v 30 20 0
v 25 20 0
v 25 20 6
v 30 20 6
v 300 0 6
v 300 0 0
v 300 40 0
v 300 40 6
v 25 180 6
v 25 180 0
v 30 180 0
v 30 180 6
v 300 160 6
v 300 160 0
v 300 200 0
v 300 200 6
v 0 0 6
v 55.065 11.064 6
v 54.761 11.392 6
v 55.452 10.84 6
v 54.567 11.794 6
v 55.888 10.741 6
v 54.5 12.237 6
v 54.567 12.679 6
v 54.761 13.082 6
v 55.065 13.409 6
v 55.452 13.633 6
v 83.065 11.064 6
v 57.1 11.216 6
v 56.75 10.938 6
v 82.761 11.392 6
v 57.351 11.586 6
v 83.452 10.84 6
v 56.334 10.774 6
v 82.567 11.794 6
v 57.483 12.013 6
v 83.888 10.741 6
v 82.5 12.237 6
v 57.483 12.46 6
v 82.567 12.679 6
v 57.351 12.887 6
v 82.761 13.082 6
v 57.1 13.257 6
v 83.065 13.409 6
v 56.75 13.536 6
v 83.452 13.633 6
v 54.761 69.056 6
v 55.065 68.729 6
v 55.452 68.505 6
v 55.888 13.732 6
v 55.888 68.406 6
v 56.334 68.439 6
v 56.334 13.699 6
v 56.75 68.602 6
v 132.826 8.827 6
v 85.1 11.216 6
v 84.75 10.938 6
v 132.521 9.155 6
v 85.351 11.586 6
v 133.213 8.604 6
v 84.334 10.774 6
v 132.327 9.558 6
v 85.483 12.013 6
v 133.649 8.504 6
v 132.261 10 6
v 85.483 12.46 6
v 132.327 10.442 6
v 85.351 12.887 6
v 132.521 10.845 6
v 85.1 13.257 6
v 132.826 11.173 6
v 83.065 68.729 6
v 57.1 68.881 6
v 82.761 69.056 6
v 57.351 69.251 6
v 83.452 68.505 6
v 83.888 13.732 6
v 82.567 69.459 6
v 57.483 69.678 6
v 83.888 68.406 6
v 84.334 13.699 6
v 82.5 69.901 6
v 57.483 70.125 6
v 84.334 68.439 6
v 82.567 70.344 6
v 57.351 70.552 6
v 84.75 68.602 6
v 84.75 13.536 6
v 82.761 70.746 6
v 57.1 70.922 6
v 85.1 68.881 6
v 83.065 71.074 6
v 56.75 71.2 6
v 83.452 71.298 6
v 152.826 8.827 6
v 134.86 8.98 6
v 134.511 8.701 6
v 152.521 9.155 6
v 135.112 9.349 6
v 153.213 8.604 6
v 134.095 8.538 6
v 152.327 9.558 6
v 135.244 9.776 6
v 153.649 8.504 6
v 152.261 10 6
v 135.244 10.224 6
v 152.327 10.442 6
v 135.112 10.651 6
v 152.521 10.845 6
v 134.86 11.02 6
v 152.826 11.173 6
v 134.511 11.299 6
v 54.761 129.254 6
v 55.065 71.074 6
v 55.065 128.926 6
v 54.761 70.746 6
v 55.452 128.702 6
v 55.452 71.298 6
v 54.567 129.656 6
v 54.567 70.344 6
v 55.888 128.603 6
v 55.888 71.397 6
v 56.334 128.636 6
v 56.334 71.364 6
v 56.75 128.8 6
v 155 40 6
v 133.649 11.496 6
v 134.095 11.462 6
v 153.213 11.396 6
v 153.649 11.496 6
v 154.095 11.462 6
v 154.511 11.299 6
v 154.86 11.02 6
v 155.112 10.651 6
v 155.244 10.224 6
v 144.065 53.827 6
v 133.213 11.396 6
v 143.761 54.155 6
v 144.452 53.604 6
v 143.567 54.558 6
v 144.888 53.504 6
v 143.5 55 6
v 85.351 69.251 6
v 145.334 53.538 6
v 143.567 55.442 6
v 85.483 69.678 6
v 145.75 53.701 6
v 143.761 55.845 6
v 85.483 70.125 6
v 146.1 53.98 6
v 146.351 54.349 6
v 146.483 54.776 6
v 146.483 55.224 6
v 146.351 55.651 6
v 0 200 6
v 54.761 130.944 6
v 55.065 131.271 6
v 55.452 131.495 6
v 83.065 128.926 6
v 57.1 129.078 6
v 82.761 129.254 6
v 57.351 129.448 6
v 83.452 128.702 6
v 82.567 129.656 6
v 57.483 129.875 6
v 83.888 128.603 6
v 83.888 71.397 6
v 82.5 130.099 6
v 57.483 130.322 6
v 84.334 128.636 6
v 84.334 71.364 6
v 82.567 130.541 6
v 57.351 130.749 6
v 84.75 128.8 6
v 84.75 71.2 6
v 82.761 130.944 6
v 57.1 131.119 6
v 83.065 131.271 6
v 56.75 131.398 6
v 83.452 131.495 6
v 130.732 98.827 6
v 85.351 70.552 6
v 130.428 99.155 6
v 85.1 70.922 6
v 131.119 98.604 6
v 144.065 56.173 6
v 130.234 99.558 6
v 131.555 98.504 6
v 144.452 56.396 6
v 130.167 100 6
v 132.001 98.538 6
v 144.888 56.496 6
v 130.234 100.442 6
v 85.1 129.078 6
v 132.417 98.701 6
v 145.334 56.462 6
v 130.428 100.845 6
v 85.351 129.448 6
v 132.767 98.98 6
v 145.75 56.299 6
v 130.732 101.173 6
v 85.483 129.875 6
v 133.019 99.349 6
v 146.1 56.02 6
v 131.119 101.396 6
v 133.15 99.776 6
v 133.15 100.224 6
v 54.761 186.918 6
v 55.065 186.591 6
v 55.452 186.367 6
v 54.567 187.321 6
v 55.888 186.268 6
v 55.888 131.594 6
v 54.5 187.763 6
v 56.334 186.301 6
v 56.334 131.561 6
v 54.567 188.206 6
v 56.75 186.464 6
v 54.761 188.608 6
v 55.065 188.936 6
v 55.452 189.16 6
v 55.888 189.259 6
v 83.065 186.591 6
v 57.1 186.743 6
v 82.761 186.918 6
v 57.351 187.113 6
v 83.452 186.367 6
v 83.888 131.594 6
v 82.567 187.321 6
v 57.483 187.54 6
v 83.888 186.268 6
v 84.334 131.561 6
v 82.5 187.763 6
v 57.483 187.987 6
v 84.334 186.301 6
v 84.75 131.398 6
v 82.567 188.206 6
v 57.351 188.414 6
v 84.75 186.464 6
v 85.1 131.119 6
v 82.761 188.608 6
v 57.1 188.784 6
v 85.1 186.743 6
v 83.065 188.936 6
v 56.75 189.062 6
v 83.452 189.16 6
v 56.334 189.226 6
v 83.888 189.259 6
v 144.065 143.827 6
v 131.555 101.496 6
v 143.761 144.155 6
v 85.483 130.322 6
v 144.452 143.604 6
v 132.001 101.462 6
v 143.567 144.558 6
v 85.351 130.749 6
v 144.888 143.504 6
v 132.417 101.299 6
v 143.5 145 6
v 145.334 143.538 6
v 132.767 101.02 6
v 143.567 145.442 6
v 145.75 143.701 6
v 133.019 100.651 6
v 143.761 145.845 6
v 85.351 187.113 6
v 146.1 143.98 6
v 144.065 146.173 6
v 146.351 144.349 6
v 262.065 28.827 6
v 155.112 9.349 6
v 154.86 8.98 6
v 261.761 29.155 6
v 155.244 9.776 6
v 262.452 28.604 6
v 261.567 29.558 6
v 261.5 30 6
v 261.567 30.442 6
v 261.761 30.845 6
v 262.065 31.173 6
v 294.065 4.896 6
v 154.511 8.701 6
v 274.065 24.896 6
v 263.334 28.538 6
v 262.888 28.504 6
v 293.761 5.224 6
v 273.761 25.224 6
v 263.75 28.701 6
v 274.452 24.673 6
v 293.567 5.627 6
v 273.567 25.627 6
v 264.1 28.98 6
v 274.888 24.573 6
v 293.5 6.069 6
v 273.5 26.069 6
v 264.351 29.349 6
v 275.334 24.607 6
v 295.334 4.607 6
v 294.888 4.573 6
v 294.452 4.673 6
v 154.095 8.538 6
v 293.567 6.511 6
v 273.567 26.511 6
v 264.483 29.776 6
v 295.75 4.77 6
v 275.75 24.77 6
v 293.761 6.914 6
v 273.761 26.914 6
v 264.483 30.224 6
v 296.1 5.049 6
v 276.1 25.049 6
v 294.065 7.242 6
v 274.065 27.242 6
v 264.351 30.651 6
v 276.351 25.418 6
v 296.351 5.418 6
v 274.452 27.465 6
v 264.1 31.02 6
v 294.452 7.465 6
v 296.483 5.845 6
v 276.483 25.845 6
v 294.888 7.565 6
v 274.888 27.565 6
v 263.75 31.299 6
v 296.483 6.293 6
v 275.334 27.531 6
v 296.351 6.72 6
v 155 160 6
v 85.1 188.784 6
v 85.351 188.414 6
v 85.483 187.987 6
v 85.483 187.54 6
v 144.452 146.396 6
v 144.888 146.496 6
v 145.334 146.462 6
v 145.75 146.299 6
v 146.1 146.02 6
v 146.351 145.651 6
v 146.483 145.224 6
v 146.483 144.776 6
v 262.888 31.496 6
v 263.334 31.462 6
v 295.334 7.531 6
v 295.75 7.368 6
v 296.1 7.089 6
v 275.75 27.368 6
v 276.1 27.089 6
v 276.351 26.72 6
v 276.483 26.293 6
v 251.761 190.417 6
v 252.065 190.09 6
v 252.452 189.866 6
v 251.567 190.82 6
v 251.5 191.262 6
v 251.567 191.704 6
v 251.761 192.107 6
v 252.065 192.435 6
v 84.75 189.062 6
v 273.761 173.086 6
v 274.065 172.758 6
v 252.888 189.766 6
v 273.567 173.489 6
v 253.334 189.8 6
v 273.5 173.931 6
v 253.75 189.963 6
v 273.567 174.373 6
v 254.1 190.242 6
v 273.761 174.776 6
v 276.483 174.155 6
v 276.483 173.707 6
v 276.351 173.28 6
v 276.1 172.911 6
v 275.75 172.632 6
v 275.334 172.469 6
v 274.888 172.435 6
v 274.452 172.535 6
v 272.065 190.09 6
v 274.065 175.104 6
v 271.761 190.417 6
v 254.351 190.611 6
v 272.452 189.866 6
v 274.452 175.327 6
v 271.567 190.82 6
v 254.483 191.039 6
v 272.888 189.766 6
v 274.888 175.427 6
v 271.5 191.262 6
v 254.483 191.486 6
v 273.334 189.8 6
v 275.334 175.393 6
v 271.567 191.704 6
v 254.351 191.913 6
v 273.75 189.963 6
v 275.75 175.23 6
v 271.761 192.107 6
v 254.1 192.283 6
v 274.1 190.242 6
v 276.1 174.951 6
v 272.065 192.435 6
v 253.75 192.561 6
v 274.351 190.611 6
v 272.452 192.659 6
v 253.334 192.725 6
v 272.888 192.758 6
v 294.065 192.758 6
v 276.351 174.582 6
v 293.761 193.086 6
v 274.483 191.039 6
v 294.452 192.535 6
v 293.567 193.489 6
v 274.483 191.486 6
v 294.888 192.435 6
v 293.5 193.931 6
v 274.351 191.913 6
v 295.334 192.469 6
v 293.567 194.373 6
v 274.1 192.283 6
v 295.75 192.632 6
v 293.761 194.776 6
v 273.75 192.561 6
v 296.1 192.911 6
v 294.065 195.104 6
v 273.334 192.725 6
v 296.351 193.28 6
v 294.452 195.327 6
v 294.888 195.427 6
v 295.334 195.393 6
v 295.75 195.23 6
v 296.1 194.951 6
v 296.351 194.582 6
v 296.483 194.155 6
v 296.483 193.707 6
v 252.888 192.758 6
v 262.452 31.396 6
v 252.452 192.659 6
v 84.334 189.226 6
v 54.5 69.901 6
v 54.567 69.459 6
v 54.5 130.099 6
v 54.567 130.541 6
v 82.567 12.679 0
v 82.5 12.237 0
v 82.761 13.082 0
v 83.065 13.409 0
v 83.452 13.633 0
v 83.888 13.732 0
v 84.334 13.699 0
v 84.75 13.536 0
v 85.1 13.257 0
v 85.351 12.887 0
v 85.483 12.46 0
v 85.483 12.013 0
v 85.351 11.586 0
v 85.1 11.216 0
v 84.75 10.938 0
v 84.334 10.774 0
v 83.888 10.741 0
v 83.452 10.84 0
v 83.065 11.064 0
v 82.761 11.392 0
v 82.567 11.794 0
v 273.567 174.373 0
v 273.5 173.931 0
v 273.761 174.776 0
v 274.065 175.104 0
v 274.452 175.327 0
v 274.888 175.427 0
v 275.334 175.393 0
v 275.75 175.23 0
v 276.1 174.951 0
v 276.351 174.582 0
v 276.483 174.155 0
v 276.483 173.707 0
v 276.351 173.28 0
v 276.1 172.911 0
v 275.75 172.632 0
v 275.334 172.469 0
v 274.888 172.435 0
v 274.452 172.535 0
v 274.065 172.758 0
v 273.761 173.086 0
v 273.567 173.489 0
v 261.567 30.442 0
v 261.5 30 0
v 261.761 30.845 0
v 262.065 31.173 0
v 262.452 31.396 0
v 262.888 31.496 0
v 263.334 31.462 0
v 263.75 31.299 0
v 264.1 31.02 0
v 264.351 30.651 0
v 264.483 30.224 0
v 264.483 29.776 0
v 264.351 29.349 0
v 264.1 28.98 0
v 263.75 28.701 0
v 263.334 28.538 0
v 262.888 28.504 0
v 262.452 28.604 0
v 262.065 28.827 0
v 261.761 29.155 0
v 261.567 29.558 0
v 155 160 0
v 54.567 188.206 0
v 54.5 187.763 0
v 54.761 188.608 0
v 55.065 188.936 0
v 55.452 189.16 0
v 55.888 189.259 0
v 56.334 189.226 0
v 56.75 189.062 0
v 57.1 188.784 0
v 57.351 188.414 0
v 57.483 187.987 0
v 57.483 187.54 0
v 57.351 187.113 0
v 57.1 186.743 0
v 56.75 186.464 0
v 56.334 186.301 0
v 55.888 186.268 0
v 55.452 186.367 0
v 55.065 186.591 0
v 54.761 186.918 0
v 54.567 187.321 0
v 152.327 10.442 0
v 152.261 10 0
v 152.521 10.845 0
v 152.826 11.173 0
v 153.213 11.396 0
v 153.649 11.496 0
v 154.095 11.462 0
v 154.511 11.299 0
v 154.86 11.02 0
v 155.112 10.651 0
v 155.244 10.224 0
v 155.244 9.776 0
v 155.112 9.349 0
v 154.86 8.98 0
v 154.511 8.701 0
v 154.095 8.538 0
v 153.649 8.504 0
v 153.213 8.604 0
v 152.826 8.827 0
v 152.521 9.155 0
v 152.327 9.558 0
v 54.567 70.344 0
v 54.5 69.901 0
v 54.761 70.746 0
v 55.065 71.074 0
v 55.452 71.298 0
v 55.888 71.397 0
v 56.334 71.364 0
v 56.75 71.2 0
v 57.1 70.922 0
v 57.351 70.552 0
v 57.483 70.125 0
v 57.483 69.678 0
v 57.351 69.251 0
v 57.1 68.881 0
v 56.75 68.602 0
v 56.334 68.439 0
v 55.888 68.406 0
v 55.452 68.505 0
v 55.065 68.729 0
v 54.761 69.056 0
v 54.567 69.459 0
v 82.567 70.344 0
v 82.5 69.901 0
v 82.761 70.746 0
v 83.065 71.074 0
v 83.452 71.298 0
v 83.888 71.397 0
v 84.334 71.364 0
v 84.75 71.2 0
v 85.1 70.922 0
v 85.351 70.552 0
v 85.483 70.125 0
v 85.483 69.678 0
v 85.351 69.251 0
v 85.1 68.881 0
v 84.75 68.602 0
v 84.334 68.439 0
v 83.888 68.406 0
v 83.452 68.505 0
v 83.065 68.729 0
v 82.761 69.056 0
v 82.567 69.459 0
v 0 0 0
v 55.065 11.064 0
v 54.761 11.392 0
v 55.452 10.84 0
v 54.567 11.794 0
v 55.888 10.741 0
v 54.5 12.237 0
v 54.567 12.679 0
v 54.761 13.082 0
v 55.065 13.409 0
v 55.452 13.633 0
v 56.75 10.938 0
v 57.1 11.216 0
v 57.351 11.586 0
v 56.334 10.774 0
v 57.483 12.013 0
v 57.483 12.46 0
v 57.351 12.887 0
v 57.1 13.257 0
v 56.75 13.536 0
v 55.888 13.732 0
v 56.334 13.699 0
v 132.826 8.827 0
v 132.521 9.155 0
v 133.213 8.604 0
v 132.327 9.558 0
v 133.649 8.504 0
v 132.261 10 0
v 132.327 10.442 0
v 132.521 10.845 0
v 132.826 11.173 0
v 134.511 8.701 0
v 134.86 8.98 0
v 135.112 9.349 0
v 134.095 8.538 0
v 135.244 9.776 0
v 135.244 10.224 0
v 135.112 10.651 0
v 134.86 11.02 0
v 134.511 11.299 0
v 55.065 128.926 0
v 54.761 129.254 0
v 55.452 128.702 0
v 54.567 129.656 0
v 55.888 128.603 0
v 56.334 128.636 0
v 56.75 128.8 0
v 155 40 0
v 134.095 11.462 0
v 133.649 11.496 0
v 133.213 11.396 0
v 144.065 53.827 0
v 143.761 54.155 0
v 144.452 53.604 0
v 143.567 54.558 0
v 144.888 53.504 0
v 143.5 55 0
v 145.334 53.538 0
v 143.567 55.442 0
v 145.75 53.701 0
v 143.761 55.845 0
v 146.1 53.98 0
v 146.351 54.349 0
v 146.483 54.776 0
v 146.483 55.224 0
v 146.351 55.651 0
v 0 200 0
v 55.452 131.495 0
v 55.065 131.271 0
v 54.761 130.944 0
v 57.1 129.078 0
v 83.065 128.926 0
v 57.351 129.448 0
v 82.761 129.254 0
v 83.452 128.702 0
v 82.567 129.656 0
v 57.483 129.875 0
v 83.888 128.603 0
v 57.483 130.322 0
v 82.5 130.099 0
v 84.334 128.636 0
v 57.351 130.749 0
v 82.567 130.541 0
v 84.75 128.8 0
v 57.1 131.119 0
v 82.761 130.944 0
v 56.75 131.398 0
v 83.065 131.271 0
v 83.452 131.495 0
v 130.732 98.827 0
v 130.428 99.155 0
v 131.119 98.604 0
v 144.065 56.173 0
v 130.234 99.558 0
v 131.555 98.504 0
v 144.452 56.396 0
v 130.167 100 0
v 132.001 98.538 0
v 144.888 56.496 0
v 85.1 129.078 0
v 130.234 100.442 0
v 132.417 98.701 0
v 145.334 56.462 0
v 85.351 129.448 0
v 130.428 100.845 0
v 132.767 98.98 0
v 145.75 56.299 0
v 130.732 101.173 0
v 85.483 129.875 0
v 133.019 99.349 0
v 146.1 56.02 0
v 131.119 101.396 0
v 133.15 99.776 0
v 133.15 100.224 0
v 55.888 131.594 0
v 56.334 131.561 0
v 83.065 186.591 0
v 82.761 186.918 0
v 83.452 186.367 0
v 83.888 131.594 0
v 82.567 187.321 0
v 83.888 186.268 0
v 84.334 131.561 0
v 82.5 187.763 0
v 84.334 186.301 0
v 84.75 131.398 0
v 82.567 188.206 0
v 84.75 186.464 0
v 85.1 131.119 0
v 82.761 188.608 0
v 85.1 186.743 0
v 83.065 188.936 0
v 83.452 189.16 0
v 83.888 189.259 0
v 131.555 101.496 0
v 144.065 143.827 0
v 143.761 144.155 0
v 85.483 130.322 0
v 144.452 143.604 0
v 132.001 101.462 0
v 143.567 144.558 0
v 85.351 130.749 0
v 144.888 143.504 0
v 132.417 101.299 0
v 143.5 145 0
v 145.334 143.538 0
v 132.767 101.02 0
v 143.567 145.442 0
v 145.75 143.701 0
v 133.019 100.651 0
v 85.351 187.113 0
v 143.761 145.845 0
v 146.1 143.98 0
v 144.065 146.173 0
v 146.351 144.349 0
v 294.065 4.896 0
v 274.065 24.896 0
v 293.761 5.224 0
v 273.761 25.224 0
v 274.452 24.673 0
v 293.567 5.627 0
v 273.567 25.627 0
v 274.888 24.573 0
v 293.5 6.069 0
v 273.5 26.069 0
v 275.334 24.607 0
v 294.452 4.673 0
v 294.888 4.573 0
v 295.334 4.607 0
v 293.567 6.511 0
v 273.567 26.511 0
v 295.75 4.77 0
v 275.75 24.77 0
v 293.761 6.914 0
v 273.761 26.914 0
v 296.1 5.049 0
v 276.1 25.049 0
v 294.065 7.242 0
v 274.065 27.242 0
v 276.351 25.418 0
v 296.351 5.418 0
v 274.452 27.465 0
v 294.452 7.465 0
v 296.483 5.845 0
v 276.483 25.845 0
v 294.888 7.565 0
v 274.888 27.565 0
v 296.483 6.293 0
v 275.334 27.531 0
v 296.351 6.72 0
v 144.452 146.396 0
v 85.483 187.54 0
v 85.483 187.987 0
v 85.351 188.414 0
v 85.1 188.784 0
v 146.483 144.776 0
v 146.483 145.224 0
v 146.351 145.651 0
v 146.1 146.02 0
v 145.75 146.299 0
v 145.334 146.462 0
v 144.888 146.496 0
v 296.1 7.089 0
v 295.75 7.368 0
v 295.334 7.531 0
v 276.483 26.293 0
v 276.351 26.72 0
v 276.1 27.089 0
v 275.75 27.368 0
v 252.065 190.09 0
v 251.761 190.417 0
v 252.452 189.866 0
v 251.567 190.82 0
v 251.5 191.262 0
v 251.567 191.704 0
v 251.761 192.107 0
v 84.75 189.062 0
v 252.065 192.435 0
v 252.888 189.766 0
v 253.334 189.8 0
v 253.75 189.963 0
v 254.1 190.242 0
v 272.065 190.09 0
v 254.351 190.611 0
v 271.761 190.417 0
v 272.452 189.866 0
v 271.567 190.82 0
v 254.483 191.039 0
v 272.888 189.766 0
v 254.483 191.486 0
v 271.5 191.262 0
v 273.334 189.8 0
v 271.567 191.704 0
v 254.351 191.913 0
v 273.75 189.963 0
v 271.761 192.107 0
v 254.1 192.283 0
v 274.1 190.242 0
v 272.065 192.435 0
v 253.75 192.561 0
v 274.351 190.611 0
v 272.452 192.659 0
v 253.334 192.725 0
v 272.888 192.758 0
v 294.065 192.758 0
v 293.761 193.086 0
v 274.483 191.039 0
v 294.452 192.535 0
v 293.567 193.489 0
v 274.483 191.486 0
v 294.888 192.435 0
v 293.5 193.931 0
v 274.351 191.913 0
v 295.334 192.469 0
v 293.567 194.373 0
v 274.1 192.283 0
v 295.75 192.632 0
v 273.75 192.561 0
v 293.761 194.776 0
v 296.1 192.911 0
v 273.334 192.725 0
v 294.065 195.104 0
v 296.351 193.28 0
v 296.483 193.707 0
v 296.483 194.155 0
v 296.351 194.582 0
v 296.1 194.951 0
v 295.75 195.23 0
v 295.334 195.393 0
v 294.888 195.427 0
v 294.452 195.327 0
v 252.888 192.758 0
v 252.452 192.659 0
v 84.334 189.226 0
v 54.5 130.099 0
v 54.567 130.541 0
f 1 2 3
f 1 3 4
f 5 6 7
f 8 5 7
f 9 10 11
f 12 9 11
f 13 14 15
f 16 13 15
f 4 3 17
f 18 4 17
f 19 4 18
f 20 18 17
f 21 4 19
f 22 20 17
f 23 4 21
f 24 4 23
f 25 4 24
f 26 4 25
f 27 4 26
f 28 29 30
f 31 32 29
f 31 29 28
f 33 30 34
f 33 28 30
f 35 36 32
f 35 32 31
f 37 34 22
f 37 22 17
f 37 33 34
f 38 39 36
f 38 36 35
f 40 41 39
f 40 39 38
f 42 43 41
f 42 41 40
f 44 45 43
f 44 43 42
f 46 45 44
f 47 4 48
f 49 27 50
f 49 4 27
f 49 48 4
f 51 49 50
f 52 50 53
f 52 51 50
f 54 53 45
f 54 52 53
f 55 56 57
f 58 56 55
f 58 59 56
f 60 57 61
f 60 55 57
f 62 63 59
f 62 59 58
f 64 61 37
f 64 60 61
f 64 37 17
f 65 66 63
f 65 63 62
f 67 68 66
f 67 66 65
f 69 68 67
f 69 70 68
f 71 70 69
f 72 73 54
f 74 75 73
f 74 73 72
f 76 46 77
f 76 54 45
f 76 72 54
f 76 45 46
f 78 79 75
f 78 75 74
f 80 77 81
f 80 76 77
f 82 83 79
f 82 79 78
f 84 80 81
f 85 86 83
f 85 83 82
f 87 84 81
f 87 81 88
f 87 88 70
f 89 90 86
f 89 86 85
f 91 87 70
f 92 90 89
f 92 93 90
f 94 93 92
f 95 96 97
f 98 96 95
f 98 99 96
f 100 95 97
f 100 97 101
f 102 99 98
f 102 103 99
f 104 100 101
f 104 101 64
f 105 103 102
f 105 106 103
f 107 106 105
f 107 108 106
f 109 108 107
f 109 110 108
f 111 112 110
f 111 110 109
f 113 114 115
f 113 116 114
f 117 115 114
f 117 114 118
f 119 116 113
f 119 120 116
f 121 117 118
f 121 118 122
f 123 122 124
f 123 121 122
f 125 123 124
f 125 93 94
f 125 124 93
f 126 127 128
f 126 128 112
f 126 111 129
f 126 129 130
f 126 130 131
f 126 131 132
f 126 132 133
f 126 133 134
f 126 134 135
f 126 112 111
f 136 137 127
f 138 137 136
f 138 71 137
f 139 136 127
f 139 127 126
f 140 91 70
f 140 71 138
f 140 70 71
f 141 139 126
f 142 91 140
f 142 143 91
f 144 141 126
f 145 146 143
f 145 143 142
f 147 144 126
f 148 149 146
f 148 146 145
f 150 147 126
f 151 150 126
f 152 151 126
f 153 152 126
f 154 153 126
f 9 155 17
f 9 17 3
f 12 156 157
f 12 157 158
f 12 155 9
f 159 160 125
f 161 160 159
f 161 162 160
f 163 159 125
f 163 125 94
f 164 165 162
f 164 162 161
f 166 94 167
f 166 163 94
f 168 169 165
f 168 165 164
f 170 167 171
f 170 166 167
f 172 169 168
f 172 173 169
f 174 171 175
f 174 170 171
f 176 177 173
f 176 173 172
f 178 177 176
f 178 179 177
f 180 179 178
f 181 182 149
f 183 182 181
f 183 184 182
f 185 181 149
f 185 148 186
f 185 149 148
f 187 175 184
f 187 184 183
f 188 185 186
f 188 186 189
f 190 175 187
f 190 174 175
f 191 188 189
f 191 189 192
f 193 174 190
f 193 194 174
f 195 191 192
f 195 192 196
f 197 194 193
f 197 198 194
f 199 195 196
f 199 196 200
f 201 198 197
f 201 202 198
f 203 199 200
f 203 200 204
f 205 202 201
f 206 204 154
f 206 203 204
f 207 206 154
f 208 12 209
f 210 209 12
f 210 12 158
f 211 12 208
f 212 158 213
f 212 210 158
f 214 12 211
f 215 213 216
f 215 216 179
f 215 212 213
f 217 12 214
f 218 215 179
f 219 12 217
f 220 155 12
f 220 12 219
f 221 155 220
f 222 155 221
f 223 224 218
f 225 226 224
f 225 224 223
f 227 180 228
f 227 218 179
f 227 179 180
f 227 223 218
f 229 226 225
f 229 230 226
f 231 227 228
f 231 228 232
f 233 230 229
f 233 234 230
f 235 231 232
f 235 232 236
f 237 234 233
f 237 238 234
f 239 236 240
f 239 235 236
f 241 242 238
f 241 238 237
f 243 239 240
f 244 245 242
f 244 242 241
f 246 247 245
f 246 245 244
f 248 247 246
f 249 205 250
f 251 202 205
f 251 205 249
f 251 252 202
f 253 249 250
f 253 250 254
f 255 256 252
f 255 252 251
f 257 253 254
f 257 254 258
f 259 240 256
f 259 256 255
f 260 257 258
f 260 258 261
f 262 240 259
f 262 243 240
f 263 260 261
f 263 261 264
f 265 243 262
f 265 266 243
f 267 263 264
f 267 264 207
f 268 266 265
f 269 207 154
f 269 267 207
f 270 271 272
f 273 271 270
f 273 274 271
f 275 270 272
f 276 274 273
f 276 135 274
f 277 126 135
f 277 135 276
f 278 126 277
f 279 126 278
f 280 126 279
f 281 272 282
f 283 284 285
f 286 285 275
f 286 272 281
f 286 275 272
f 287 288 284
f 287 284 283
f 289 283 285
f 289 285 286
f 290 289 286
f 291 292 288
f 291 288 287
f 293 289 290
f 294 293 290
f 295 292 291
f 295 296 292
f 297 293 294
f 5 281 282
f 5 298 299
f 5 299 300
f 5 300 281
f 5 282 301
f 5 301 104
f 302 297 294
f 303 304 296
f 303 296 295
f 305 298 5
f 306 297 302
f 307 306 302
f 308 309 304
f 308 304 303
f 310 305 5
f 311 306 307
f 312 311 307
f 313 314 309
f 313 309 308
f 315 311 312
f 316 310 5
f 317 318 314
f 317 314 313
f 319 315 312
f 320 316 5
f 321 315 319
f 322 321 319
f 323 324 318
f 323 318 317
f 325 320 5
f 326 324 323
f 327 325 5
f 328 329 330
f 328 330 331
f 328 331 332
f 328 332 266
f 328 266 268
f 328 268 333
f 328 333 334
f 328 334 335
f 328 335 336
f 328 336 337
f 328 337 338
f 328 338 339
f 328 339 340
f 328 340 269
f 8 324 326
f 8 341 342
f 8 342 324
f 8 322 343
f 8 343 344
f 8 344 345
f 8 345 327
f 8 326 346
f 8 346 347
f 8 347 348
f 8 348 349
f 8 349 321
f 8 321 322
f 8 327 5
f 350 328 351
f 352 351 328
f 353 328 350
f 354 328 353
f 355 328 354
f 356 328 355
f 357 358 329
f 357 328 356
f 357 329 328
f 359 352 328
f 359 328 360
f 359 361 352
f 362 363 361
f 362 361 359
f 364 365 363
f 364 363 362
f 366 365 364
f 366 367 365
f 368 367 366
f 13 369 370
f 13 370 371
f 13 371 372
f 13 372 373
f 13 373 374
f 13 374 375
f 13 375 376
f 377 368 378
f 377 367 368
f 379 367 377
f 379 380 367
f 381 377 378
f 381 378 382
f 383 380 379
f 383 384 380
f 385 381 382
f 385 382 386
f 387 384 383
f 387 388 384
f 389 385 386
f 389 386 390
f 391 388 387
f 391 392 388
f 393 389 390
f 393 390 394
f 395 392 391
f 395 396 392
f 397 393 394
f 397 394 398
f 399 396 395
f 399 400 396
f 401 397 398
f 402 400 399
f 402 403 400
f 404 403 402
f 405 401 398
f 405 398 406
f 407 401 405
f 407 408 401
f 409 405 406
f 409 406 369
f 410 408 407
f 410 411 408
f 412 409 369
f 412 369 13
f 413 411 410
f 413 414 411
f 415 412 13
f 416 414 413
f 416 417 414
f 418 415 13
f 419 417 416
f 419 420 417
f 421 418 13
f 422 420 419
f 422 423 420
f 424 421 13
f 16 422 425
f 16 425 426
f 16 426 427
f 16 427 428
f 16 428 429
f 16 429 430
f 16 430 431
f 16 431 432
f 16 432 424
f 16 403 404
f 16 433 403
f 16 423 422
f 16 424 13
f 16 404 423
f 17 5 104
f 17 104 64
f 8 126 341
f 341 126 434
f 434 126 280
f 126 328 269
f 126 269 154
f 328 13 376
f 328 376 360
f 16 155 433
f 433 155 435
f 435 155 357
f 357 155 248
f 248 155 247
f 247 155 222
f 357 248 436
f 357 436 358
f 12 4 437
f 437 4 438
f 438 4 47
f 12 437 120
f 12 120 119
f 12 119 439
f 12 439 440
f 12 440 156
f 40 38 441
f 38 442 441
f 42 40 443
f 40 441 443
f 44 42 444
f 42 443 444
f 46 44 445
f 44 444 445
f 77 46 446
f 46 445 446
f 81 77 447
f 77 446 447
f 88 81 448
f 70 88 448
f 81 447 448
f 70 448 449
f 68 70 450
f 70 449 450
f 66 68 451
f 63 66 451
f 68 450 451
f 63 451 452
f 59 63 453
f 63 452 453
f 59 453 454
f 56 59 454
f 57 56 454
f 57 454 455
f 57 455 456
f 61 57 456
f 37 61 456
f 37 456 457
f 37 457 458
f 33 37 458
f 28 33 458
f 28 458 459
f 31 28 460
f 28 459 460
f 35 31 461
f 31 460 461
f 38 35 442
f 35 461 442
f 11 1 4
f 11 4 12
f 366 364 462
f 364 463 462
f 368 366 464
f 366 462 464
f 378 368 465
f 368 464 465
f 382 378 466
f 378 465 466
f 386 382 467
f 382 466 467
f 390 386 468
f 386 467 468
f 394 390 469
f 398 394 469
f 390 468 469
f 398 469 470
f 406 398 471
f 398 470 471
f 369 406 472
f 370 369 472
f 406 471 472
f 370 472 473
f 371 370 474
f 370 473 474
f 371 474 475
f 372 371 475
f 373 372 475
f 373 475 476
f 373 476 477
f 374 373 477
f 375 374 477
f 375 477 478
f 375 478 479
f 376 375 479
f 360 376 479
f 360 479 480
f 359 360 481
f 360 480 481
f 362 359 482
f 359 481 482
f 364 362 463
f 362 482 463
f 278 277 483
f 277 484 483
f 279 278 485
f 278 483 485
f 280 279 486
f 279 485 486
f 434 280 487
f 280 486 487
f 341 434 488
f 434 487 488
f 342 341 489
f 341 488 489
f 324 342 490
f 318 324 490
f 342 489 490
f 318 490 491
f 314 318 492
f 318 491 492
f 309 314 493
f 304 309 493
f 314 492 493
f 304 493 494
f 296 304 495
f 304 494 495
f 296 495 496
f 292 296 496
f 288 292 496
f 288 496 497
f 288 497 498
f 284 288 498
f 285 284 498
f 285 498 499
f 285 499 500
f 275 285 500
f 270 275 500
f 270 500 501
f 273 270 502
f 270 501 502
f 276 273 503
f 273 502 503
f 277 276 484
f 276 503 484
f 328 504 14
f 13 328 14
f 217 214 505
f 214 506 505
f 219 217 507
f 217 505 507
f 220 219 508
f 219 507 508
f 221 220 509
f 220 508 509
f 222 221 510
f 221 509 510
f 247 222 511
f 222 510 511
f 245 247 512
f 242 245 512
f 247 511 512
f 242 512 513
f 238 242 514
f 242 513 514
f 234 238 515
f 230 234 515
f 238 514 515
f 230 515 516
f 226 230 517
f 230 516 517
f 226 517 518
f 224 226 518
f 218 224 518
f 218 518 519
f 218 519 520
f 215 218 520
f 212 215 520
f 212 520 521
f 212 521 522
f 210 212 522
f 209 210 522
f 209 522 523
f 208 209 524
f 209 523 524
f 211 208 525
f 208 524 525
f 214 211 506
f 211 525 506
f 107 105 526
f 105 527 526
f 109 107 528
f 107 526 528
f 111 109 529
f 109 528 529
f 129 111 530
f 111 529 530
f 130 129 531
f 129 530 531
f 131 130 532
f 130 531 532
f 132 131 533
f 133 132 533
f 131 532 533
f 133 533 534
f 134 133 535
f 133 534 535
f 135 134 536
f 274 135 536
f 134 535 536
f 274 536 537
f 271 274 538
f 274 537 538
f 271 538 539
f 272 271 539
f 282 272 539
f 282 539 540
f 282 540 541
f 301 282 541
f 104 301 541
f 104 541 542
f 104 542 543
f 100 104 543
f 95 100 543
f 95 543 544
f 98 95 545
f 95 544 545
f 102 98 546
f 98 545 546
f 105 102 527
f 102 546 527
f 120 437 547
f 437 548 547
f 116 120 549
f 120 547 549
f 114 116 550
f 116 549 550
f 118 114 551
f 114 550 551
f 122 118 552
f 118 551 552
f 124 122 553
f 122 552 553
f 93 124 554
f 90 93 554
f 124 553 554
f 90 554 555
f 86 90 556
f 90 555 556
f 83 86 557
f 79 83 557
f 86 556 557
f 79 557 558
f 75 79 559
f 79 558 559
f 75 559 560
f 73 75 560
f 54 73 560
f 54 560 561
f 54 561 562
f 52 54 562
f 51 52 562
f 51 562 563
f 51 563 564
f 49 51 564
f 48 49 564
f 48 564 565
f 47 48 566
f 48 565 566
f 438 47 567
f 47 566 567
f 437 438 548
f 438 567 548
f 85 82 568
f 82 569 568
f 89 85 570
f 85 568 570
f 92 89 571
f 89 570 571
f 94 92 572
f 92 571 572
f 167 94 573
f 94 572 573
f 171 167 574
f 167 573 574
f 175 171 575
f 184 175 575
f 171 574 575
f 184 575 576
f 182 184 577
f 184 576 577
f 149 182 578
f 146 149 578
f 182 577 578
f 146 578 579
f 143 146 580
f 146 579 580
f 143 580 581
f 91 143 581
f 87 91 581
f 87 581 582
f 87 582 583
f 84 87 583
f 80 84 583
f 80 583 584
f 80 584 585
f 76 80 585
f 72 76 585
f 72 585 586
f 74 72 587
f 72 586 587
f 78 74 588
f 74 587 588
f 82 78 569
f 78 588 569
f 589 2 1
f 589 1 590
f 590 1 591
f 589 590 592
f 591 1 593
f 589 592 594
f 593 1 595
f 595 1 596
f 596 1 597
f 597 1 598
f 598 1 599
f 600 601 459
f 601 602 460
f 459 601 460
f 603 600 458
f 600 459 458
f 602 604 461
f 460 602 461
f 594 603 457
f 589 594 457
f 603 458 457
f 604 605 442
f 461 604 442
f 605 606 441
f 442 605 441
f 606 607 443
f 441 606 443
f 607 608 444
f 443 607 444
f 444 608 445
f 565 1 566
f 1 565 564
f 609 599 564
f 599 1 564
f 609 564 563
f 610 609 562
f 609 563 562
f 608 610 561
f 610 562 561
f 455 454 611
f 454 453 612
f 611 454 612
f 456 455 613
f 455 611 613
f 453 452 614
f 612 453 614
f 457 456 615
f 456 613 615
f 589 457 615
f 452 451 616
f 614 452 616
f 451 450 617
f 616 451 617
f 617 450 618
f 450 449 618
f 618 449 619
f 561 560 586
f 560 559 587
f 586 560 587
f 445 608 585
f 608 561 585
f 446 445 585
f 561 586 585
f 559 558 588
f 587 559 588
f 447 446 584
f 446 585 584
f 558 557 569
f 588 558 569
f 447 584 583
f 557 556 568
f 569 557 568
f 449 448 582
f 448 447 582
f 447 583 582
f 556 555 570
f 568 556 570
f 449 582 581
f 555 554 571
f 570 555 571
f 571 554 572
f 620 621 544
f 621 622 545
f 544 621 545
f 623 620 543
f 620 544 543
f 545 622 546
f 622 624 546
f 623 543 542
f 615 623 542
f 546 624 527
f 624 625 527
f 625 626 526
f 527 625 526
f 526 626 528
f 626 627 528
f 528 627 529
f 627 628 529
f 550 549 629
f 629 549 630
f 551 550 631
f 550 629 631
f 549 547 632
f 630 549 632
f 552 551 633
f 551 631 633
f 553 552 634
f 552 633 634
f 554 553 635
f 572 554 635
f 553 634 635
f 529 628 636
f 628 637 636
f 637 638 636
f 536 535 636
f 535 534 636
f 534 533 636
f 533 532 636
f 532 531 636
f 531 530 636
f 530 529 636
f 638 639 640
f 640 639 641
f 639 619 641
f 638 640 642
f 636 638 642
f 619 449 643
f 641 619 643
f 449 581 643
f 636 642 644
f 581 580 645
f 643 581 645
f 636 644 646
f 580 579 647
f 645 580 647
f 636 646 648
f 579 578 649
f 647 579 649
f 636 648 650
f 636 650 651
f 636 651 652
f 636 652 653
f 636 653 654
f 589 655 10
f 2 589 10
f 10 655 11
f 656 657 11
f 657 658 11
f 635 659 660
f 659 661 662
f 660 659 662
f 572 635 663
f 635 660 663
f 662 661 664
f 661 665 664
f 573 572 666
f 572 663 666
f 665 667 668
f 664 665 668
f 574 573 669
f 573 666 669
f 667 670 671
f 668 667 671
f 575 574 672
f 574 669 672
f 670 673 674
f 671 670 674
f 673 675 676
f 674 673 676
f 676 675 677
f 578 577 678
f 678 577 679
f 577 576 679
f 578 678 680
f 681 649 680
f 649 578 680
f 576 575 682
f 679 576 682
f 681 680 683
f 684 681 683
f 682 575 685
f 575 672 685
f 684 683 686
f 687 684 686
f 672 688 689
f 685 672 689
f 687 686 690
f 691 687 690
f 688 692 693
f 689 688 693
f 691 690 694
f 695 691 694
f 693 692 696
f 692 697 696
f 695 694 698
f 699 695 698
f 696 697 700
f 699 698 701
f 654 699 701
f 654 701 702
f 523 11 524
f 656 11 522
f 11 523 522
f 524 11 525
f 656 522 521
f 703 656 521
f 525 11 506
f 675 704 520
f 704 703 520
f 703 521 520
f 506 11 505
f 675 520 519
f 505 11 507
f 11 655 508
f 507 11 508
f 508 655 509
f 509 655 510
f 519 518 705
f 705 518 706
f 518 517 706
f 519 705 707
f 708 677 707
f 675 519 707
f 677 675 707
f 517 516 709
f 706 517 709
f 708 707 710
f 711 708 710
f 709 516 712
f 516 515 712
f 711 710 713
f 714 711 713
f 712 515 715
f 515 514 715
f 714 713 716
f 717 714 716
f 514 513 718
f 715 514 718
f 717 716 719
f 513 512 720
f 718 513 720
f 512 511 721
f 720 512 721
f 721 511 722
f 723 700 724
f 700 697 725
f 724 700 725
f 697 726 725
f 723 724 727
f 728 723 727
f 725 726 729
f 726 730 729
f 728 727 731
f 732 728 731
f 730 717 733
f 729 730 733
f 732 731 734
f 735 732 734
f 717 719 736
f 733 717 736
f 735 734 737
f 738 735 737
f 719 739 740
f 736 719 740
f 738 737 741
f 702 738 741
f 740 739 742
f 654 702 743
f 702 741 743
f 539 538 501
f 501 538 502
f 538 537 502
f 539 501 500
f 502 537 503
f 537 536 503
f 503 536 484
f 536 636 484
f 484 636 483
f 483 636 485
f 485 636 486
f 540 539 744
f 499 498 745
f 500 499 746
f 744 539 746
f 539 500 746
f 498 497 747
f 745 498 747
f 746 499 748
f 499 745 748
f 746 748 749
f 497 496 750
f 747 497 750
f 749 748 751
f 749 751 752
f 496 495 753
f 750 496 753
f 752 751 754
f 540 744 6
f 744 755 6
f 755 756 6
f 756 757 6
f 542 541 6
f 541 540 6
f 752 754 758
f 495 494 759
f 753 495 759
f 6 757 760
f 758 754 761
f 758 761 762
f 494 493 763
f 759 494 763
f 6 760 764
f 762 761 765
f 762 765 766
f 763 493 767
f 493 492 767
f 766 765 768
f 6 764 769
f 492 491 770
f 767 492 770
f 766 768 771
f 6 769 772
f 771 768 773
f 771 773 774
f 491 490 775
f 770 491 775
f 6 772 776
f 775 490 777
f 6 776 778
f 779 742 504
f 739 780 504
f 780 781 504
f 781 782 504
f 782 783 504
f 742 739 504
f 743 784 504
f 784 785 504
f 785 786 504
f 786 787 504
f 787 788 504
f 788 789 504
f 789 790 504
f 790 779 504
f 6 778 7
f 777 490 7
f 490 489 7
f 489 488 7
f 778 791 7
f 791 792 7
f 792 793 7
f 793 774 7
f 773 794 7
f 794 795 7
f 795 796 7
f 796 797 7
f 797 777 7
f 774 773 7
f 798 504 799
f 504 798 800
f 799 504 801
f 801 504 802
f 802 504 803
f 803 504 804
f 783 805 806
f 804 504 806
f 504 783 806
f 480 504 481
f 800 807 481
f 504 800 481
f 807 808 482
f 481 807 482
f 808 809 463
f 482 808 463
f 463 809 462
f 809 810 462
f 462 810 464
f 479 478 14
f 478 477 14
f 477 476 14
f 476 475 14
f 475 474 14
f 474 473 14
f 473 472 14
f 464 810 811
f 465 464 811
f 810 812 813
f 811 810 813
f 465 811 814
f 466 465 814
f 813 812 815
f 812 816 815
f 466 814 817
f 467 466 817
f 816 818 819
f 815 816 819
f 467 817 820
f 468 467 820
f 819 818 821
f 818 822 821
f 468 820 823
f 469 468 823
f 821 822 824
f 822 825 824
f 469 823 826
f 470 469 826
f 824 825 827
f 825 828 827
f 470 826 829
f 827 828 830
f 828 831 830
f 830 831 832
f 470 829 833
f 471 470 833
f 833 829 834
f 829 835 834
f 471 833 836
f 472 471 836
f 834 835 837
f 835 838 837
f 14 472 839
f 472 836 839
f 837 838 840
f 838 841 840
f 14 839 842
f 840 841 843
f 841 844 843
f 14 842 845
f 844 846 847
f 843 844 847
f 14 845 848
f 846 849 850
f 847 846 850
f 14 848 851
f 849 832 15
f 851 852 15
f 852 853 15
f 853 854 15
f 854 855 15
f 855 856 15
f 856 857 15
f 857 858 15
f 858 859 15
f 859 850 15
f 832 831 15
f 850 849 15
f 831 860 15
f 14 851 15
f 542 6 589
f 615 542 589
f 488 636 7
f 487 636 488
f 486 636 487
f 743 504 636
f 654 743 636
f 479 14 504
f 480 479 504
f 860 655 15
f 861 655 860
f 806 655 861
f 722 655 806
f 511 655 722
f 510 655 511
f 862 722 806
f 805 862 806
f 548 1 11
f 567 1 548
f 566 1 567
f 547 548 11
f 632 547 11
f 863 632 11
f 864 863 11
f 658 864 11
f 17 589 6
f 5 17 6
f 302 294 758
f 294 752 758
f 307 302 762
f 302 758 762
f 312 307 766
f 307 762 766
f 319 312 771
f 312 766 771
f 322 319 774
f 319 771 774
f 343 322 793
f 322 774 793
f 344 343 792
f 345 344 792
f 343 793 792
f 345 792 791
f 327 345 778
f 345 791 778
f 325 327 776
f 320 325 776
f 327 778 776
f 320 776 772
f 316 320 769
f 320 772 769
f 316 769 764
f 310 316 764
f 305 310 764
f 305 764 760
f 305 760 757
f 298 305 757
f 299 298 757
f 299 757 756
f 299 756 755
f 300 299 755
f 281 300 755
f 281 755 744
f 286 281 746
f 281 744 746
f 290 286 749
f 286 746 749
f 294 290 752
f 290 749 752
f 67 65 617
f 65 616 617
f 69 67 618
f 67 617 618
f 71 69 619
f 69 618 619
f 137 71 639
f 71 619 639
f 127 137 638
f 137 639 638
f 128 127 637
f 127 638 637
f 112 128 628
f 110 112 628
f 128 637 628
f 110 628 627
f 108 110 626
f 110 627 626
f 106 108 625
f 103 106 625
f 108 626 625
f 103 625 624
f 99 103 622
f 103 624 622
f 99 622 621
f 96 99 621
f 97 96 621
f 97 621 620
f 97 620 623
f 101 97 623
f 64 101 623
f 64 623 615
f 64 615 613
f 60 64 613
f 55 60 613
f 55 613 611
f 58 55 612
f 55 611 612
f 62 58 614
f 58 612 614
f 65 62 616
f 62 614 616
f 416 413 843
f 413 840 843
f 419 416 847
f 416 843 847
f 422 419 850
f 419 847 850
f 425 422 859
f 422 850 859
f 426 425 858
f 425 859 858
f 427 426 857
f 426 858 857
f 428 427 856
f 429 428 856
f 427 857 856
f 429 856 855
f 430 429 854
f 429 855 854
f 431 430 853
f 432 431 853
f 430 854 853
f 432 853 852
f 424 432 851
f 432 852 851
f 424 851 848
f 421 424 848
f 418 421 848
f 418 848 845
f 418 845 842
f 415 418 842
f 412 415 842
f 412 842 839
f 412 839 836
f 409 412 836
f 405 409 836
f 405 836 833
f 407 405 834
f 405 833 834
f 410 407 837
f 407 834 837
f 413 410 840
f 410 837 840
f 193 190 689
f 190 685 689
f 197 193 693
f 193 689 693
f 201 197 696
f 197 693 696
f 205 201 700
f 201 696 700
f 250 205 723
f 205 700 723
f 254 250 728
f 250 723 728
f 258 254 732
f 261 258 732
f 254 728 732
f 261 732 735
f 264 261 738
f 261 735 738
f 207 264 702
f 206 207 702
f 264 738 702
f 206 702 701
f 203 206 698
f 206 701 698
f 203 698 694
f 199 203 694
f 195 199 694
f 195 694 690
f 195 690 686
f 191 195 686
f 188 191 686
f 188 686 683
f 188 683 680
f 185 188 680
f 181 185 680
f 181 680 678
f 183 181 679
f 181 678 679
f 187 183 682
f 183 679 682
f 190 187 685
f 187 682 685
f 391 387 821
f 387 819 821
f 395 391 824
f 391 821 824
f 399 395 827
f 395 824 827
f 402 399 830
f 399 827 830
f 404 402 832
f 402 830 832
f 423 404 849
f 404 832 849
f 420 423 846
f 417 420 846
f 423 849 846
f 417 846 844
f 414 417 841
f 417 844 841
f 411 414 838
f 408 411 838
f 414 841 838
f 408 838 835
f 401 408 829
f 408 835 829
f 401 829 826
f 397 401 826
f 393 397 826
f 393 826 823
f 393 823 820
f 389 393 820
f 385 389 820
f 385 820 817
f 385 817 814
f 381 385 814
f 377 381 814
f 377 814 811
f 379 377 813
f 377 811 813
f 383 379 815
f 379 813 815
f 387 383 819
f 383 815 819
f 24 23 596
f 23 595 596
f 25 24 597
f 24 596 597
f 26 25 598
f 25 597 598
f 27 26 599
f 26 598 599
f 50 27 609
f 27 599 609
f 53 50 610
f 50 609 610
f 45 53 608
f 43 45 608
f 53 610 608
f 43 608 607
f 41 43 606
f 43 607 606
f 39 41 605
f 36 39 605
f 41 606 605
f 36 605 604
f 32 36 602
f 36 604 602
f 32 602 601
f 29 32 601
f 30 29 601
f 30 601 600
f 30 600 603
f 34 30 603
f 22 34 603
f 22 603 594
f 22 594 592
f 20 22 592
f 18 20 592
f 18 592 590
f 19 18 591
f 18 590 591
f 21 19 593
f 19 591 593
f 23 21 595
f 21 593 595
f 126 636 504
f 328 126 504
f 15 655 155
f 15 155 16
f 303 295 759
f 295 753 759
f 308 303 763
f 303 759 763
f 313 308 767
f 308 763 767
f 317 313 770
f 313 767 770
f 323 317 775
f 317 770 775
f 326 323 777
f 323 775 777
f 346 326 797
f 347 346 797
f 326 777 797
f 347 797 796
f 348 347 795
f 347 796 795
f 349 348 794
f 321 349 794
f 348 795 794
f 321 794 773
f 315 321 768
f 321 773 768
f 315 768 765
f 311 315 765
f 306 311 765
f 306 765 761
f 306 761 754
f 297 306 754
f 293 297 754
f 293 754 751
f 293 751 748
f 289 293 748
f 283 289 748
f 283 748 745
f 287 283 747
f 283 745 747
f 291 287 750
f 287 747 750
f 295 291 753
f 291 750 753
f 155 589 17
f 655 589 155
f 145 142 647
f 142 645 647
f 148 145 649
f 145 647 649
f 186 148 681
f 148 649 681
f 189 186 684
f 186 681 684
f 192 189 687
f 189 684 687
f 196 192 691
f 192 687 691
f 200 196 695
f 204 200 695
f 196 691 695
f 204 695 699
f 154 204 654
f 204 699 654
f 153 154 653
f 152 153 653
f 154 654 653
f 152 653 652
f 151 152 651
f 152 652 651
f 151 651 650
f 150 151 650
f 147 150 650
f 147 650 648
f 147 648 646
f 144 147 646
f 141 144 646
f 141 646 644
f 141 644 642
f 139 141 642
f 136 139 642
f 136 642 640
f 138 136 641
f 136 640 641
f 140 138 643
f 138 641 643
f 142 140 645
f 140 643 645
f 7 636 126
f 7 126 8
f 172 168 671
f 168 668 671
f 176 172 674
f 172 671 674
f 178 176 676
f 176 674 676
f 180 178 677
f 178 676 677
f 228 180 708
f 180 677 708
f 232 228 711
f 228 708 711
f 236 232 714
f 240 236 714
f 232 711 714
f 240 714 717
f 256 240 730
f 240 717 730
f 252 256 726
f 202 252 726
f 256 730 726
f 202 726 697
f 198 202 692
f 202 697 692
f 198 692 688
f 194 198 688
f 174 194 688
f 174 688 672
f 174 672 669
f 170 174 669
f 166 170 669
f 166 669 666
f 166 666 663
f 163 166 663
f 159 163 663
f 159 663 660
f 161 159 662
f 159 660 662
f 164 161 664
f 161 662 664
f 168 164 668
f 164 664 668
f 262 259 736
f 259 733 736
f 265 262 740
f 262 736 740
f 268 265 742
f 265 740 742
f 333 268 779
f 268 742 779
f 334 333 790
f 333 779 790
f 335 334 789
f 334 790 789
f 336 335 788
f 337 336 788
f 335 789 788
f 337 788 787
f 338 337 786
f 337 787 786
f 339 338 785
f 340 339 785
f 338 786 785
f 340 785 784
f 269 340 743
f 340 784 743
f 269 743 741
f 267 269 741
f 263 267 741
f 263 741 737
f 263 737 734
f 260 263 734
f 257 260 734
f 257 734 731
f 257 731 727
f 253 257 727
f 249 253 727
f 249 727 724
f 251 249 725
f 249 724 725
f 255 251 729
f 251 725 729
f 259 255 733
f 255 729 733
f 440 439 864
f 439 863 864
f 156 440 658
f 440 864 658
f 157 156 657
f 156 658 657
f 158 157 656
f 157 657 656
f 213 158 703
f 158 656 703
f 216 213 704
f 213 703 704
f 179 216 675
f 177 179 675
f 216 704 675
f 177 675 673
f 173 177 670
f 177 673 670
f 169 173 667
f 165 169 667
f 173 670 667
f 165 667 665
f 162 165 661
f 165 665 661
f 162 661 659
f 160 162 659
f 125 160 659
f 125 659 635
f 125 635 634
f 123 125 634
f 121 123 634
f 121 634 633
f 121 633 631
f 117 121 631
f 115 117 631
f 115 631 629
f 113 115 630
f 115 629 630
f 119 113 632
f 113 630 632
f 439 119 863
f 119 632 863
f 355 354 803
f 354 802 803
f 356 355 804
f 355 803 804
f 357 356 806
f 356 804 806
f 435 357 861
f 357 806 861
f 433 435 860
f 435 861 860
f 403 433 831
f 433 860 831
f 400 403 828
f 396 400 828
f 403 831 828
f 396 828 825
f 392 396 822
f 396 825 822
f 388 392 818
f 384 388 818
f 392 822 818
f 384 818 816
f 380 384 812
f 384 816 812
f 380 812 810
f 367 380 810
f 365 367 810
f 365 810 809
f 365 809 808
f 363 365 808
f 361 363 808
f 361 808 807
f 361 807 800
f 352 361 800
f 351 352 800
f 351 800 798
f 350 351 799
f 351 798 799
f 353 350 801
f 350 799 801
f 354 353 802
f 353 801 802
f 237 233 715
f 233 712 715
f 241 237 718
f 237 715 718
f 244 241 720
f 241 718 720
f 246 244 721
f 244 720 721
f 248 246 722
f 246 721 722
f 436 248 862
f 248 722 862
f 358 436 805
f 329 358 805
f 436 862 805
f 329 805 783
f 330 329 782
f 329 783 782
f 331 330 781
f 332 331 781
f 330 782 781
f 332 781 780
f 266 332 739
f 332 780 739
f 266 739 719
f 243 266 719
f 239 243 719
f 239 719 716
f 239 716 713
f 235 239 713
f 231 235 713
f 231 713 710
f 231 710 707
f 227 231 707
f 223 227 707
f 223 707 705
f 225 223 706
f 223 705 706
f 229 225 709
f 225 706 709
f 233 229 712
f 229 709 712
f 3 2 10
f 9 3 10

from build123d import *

# Parameters (mm, degrees)
SKETCH1_W                       = 300
SKETCH1_H                       = 200
BOSS_EXTRUDE1_DEPTH             = 6
SKETCH2_W                       = 145
SKETCH2_H                       = 120
CUT_EXTRUDE1_DEPTH              = 6
SKETCH3_W                       = 5
SKETCH3_H                       = 160
CUT_EXTRUDE2_DEPTH              = 6
F_3_0MM_PRESS_DOWEL_HOLE1_D     = 3
F_3_0MM_PRESS_DOWEL_HOLE1_DEPTH = 6
F_3_0MM_PRESS_DOWEL_HOLE1_TIP   = 0.901290929


with BuildPart() as part:
    # Sketch1 → Boss-Extrude1 (new body)
    with BuildSketch(Plane.XY):
        with Locations((150, 100)):
            Rectangle(SKETCH1_W, SKETCH1_H)
    extrude(amount=BOSS_EXTRUDE1_DEPTH)

    # Sketch2 → Cut-Extrude1 (cut)
    with BuildSketch(Plane.XY):
        with Locations((227.5, 100)):
            Rectangle(SKETCH2_W, SKETCH2_H)
    extrude(amount=CUT_EXTRUDE1_DEPTH, mode=Mode.SUBTRACT)

    # Sketch3 → Cut-Extrude2 (cut)
    with BuildSketch(Plane.XY):
        with Locations((27.5, 100)):
            Rectangle(SKETCH3_W, SKETCH3_H)
    extrude(amount=CUT_EXTRUDE2_DEPTH, mode=Mode.SUBTRACT)

    # Ø3.0mm Press Dowel Hole1
    with Locations(Plane(origin=(42.474486637, -126.531359221, 6), x_dir=(1, 0, 0), z_dir=(0, 0, 1))):
        with Locations((220.525513363, 156.531359221), (102.525513363, 181.531359221), (102.525513363, 271.531359221), (89.19270005, 226.531359221), (210.525513363, 317.793651488), (230.525513363, 317.793651488), (252.525513363, 320.462332131), (232.525513363, 300.462332131), (252.525513363, 132.600386311), (232.525513363, 152.600386311), (111.286271896, 136.531359221), (91.286271896, 136.531359221), (41.525513363, 196.432813402), (13.525513363, 196.432813402), (41.525513363, 138.767959221), (13.525513363, 138.767959221), (41.525513363, 256.62990504), (13.525513363, 256.62990504), (41.525513363, 314.294759221), (13.525513363, 314.294759221)):
            Hole(F_3_0MM_PRESS_DOWEL_HOLE1_D / 2, depth=F_3_0MM_PRESS_DOWEL_HOLE1_DEPTH)
            with Locations((0, 0, -(F_3_0MM_PRESS_DOWEL_HOLE1_DEPTH + F_3_0MM_PRESS_DOWEL_HOLE1_TIP / 2))):  # 118° drill point
                Cone(0, F_3_0MM_PRESS_DOWEL_HOLE1_D / 2, F_3_0MM_PRESS_DOWEL_HOLE1_TIP, mode=Mode.SUBTRACT)


solid = part.part
